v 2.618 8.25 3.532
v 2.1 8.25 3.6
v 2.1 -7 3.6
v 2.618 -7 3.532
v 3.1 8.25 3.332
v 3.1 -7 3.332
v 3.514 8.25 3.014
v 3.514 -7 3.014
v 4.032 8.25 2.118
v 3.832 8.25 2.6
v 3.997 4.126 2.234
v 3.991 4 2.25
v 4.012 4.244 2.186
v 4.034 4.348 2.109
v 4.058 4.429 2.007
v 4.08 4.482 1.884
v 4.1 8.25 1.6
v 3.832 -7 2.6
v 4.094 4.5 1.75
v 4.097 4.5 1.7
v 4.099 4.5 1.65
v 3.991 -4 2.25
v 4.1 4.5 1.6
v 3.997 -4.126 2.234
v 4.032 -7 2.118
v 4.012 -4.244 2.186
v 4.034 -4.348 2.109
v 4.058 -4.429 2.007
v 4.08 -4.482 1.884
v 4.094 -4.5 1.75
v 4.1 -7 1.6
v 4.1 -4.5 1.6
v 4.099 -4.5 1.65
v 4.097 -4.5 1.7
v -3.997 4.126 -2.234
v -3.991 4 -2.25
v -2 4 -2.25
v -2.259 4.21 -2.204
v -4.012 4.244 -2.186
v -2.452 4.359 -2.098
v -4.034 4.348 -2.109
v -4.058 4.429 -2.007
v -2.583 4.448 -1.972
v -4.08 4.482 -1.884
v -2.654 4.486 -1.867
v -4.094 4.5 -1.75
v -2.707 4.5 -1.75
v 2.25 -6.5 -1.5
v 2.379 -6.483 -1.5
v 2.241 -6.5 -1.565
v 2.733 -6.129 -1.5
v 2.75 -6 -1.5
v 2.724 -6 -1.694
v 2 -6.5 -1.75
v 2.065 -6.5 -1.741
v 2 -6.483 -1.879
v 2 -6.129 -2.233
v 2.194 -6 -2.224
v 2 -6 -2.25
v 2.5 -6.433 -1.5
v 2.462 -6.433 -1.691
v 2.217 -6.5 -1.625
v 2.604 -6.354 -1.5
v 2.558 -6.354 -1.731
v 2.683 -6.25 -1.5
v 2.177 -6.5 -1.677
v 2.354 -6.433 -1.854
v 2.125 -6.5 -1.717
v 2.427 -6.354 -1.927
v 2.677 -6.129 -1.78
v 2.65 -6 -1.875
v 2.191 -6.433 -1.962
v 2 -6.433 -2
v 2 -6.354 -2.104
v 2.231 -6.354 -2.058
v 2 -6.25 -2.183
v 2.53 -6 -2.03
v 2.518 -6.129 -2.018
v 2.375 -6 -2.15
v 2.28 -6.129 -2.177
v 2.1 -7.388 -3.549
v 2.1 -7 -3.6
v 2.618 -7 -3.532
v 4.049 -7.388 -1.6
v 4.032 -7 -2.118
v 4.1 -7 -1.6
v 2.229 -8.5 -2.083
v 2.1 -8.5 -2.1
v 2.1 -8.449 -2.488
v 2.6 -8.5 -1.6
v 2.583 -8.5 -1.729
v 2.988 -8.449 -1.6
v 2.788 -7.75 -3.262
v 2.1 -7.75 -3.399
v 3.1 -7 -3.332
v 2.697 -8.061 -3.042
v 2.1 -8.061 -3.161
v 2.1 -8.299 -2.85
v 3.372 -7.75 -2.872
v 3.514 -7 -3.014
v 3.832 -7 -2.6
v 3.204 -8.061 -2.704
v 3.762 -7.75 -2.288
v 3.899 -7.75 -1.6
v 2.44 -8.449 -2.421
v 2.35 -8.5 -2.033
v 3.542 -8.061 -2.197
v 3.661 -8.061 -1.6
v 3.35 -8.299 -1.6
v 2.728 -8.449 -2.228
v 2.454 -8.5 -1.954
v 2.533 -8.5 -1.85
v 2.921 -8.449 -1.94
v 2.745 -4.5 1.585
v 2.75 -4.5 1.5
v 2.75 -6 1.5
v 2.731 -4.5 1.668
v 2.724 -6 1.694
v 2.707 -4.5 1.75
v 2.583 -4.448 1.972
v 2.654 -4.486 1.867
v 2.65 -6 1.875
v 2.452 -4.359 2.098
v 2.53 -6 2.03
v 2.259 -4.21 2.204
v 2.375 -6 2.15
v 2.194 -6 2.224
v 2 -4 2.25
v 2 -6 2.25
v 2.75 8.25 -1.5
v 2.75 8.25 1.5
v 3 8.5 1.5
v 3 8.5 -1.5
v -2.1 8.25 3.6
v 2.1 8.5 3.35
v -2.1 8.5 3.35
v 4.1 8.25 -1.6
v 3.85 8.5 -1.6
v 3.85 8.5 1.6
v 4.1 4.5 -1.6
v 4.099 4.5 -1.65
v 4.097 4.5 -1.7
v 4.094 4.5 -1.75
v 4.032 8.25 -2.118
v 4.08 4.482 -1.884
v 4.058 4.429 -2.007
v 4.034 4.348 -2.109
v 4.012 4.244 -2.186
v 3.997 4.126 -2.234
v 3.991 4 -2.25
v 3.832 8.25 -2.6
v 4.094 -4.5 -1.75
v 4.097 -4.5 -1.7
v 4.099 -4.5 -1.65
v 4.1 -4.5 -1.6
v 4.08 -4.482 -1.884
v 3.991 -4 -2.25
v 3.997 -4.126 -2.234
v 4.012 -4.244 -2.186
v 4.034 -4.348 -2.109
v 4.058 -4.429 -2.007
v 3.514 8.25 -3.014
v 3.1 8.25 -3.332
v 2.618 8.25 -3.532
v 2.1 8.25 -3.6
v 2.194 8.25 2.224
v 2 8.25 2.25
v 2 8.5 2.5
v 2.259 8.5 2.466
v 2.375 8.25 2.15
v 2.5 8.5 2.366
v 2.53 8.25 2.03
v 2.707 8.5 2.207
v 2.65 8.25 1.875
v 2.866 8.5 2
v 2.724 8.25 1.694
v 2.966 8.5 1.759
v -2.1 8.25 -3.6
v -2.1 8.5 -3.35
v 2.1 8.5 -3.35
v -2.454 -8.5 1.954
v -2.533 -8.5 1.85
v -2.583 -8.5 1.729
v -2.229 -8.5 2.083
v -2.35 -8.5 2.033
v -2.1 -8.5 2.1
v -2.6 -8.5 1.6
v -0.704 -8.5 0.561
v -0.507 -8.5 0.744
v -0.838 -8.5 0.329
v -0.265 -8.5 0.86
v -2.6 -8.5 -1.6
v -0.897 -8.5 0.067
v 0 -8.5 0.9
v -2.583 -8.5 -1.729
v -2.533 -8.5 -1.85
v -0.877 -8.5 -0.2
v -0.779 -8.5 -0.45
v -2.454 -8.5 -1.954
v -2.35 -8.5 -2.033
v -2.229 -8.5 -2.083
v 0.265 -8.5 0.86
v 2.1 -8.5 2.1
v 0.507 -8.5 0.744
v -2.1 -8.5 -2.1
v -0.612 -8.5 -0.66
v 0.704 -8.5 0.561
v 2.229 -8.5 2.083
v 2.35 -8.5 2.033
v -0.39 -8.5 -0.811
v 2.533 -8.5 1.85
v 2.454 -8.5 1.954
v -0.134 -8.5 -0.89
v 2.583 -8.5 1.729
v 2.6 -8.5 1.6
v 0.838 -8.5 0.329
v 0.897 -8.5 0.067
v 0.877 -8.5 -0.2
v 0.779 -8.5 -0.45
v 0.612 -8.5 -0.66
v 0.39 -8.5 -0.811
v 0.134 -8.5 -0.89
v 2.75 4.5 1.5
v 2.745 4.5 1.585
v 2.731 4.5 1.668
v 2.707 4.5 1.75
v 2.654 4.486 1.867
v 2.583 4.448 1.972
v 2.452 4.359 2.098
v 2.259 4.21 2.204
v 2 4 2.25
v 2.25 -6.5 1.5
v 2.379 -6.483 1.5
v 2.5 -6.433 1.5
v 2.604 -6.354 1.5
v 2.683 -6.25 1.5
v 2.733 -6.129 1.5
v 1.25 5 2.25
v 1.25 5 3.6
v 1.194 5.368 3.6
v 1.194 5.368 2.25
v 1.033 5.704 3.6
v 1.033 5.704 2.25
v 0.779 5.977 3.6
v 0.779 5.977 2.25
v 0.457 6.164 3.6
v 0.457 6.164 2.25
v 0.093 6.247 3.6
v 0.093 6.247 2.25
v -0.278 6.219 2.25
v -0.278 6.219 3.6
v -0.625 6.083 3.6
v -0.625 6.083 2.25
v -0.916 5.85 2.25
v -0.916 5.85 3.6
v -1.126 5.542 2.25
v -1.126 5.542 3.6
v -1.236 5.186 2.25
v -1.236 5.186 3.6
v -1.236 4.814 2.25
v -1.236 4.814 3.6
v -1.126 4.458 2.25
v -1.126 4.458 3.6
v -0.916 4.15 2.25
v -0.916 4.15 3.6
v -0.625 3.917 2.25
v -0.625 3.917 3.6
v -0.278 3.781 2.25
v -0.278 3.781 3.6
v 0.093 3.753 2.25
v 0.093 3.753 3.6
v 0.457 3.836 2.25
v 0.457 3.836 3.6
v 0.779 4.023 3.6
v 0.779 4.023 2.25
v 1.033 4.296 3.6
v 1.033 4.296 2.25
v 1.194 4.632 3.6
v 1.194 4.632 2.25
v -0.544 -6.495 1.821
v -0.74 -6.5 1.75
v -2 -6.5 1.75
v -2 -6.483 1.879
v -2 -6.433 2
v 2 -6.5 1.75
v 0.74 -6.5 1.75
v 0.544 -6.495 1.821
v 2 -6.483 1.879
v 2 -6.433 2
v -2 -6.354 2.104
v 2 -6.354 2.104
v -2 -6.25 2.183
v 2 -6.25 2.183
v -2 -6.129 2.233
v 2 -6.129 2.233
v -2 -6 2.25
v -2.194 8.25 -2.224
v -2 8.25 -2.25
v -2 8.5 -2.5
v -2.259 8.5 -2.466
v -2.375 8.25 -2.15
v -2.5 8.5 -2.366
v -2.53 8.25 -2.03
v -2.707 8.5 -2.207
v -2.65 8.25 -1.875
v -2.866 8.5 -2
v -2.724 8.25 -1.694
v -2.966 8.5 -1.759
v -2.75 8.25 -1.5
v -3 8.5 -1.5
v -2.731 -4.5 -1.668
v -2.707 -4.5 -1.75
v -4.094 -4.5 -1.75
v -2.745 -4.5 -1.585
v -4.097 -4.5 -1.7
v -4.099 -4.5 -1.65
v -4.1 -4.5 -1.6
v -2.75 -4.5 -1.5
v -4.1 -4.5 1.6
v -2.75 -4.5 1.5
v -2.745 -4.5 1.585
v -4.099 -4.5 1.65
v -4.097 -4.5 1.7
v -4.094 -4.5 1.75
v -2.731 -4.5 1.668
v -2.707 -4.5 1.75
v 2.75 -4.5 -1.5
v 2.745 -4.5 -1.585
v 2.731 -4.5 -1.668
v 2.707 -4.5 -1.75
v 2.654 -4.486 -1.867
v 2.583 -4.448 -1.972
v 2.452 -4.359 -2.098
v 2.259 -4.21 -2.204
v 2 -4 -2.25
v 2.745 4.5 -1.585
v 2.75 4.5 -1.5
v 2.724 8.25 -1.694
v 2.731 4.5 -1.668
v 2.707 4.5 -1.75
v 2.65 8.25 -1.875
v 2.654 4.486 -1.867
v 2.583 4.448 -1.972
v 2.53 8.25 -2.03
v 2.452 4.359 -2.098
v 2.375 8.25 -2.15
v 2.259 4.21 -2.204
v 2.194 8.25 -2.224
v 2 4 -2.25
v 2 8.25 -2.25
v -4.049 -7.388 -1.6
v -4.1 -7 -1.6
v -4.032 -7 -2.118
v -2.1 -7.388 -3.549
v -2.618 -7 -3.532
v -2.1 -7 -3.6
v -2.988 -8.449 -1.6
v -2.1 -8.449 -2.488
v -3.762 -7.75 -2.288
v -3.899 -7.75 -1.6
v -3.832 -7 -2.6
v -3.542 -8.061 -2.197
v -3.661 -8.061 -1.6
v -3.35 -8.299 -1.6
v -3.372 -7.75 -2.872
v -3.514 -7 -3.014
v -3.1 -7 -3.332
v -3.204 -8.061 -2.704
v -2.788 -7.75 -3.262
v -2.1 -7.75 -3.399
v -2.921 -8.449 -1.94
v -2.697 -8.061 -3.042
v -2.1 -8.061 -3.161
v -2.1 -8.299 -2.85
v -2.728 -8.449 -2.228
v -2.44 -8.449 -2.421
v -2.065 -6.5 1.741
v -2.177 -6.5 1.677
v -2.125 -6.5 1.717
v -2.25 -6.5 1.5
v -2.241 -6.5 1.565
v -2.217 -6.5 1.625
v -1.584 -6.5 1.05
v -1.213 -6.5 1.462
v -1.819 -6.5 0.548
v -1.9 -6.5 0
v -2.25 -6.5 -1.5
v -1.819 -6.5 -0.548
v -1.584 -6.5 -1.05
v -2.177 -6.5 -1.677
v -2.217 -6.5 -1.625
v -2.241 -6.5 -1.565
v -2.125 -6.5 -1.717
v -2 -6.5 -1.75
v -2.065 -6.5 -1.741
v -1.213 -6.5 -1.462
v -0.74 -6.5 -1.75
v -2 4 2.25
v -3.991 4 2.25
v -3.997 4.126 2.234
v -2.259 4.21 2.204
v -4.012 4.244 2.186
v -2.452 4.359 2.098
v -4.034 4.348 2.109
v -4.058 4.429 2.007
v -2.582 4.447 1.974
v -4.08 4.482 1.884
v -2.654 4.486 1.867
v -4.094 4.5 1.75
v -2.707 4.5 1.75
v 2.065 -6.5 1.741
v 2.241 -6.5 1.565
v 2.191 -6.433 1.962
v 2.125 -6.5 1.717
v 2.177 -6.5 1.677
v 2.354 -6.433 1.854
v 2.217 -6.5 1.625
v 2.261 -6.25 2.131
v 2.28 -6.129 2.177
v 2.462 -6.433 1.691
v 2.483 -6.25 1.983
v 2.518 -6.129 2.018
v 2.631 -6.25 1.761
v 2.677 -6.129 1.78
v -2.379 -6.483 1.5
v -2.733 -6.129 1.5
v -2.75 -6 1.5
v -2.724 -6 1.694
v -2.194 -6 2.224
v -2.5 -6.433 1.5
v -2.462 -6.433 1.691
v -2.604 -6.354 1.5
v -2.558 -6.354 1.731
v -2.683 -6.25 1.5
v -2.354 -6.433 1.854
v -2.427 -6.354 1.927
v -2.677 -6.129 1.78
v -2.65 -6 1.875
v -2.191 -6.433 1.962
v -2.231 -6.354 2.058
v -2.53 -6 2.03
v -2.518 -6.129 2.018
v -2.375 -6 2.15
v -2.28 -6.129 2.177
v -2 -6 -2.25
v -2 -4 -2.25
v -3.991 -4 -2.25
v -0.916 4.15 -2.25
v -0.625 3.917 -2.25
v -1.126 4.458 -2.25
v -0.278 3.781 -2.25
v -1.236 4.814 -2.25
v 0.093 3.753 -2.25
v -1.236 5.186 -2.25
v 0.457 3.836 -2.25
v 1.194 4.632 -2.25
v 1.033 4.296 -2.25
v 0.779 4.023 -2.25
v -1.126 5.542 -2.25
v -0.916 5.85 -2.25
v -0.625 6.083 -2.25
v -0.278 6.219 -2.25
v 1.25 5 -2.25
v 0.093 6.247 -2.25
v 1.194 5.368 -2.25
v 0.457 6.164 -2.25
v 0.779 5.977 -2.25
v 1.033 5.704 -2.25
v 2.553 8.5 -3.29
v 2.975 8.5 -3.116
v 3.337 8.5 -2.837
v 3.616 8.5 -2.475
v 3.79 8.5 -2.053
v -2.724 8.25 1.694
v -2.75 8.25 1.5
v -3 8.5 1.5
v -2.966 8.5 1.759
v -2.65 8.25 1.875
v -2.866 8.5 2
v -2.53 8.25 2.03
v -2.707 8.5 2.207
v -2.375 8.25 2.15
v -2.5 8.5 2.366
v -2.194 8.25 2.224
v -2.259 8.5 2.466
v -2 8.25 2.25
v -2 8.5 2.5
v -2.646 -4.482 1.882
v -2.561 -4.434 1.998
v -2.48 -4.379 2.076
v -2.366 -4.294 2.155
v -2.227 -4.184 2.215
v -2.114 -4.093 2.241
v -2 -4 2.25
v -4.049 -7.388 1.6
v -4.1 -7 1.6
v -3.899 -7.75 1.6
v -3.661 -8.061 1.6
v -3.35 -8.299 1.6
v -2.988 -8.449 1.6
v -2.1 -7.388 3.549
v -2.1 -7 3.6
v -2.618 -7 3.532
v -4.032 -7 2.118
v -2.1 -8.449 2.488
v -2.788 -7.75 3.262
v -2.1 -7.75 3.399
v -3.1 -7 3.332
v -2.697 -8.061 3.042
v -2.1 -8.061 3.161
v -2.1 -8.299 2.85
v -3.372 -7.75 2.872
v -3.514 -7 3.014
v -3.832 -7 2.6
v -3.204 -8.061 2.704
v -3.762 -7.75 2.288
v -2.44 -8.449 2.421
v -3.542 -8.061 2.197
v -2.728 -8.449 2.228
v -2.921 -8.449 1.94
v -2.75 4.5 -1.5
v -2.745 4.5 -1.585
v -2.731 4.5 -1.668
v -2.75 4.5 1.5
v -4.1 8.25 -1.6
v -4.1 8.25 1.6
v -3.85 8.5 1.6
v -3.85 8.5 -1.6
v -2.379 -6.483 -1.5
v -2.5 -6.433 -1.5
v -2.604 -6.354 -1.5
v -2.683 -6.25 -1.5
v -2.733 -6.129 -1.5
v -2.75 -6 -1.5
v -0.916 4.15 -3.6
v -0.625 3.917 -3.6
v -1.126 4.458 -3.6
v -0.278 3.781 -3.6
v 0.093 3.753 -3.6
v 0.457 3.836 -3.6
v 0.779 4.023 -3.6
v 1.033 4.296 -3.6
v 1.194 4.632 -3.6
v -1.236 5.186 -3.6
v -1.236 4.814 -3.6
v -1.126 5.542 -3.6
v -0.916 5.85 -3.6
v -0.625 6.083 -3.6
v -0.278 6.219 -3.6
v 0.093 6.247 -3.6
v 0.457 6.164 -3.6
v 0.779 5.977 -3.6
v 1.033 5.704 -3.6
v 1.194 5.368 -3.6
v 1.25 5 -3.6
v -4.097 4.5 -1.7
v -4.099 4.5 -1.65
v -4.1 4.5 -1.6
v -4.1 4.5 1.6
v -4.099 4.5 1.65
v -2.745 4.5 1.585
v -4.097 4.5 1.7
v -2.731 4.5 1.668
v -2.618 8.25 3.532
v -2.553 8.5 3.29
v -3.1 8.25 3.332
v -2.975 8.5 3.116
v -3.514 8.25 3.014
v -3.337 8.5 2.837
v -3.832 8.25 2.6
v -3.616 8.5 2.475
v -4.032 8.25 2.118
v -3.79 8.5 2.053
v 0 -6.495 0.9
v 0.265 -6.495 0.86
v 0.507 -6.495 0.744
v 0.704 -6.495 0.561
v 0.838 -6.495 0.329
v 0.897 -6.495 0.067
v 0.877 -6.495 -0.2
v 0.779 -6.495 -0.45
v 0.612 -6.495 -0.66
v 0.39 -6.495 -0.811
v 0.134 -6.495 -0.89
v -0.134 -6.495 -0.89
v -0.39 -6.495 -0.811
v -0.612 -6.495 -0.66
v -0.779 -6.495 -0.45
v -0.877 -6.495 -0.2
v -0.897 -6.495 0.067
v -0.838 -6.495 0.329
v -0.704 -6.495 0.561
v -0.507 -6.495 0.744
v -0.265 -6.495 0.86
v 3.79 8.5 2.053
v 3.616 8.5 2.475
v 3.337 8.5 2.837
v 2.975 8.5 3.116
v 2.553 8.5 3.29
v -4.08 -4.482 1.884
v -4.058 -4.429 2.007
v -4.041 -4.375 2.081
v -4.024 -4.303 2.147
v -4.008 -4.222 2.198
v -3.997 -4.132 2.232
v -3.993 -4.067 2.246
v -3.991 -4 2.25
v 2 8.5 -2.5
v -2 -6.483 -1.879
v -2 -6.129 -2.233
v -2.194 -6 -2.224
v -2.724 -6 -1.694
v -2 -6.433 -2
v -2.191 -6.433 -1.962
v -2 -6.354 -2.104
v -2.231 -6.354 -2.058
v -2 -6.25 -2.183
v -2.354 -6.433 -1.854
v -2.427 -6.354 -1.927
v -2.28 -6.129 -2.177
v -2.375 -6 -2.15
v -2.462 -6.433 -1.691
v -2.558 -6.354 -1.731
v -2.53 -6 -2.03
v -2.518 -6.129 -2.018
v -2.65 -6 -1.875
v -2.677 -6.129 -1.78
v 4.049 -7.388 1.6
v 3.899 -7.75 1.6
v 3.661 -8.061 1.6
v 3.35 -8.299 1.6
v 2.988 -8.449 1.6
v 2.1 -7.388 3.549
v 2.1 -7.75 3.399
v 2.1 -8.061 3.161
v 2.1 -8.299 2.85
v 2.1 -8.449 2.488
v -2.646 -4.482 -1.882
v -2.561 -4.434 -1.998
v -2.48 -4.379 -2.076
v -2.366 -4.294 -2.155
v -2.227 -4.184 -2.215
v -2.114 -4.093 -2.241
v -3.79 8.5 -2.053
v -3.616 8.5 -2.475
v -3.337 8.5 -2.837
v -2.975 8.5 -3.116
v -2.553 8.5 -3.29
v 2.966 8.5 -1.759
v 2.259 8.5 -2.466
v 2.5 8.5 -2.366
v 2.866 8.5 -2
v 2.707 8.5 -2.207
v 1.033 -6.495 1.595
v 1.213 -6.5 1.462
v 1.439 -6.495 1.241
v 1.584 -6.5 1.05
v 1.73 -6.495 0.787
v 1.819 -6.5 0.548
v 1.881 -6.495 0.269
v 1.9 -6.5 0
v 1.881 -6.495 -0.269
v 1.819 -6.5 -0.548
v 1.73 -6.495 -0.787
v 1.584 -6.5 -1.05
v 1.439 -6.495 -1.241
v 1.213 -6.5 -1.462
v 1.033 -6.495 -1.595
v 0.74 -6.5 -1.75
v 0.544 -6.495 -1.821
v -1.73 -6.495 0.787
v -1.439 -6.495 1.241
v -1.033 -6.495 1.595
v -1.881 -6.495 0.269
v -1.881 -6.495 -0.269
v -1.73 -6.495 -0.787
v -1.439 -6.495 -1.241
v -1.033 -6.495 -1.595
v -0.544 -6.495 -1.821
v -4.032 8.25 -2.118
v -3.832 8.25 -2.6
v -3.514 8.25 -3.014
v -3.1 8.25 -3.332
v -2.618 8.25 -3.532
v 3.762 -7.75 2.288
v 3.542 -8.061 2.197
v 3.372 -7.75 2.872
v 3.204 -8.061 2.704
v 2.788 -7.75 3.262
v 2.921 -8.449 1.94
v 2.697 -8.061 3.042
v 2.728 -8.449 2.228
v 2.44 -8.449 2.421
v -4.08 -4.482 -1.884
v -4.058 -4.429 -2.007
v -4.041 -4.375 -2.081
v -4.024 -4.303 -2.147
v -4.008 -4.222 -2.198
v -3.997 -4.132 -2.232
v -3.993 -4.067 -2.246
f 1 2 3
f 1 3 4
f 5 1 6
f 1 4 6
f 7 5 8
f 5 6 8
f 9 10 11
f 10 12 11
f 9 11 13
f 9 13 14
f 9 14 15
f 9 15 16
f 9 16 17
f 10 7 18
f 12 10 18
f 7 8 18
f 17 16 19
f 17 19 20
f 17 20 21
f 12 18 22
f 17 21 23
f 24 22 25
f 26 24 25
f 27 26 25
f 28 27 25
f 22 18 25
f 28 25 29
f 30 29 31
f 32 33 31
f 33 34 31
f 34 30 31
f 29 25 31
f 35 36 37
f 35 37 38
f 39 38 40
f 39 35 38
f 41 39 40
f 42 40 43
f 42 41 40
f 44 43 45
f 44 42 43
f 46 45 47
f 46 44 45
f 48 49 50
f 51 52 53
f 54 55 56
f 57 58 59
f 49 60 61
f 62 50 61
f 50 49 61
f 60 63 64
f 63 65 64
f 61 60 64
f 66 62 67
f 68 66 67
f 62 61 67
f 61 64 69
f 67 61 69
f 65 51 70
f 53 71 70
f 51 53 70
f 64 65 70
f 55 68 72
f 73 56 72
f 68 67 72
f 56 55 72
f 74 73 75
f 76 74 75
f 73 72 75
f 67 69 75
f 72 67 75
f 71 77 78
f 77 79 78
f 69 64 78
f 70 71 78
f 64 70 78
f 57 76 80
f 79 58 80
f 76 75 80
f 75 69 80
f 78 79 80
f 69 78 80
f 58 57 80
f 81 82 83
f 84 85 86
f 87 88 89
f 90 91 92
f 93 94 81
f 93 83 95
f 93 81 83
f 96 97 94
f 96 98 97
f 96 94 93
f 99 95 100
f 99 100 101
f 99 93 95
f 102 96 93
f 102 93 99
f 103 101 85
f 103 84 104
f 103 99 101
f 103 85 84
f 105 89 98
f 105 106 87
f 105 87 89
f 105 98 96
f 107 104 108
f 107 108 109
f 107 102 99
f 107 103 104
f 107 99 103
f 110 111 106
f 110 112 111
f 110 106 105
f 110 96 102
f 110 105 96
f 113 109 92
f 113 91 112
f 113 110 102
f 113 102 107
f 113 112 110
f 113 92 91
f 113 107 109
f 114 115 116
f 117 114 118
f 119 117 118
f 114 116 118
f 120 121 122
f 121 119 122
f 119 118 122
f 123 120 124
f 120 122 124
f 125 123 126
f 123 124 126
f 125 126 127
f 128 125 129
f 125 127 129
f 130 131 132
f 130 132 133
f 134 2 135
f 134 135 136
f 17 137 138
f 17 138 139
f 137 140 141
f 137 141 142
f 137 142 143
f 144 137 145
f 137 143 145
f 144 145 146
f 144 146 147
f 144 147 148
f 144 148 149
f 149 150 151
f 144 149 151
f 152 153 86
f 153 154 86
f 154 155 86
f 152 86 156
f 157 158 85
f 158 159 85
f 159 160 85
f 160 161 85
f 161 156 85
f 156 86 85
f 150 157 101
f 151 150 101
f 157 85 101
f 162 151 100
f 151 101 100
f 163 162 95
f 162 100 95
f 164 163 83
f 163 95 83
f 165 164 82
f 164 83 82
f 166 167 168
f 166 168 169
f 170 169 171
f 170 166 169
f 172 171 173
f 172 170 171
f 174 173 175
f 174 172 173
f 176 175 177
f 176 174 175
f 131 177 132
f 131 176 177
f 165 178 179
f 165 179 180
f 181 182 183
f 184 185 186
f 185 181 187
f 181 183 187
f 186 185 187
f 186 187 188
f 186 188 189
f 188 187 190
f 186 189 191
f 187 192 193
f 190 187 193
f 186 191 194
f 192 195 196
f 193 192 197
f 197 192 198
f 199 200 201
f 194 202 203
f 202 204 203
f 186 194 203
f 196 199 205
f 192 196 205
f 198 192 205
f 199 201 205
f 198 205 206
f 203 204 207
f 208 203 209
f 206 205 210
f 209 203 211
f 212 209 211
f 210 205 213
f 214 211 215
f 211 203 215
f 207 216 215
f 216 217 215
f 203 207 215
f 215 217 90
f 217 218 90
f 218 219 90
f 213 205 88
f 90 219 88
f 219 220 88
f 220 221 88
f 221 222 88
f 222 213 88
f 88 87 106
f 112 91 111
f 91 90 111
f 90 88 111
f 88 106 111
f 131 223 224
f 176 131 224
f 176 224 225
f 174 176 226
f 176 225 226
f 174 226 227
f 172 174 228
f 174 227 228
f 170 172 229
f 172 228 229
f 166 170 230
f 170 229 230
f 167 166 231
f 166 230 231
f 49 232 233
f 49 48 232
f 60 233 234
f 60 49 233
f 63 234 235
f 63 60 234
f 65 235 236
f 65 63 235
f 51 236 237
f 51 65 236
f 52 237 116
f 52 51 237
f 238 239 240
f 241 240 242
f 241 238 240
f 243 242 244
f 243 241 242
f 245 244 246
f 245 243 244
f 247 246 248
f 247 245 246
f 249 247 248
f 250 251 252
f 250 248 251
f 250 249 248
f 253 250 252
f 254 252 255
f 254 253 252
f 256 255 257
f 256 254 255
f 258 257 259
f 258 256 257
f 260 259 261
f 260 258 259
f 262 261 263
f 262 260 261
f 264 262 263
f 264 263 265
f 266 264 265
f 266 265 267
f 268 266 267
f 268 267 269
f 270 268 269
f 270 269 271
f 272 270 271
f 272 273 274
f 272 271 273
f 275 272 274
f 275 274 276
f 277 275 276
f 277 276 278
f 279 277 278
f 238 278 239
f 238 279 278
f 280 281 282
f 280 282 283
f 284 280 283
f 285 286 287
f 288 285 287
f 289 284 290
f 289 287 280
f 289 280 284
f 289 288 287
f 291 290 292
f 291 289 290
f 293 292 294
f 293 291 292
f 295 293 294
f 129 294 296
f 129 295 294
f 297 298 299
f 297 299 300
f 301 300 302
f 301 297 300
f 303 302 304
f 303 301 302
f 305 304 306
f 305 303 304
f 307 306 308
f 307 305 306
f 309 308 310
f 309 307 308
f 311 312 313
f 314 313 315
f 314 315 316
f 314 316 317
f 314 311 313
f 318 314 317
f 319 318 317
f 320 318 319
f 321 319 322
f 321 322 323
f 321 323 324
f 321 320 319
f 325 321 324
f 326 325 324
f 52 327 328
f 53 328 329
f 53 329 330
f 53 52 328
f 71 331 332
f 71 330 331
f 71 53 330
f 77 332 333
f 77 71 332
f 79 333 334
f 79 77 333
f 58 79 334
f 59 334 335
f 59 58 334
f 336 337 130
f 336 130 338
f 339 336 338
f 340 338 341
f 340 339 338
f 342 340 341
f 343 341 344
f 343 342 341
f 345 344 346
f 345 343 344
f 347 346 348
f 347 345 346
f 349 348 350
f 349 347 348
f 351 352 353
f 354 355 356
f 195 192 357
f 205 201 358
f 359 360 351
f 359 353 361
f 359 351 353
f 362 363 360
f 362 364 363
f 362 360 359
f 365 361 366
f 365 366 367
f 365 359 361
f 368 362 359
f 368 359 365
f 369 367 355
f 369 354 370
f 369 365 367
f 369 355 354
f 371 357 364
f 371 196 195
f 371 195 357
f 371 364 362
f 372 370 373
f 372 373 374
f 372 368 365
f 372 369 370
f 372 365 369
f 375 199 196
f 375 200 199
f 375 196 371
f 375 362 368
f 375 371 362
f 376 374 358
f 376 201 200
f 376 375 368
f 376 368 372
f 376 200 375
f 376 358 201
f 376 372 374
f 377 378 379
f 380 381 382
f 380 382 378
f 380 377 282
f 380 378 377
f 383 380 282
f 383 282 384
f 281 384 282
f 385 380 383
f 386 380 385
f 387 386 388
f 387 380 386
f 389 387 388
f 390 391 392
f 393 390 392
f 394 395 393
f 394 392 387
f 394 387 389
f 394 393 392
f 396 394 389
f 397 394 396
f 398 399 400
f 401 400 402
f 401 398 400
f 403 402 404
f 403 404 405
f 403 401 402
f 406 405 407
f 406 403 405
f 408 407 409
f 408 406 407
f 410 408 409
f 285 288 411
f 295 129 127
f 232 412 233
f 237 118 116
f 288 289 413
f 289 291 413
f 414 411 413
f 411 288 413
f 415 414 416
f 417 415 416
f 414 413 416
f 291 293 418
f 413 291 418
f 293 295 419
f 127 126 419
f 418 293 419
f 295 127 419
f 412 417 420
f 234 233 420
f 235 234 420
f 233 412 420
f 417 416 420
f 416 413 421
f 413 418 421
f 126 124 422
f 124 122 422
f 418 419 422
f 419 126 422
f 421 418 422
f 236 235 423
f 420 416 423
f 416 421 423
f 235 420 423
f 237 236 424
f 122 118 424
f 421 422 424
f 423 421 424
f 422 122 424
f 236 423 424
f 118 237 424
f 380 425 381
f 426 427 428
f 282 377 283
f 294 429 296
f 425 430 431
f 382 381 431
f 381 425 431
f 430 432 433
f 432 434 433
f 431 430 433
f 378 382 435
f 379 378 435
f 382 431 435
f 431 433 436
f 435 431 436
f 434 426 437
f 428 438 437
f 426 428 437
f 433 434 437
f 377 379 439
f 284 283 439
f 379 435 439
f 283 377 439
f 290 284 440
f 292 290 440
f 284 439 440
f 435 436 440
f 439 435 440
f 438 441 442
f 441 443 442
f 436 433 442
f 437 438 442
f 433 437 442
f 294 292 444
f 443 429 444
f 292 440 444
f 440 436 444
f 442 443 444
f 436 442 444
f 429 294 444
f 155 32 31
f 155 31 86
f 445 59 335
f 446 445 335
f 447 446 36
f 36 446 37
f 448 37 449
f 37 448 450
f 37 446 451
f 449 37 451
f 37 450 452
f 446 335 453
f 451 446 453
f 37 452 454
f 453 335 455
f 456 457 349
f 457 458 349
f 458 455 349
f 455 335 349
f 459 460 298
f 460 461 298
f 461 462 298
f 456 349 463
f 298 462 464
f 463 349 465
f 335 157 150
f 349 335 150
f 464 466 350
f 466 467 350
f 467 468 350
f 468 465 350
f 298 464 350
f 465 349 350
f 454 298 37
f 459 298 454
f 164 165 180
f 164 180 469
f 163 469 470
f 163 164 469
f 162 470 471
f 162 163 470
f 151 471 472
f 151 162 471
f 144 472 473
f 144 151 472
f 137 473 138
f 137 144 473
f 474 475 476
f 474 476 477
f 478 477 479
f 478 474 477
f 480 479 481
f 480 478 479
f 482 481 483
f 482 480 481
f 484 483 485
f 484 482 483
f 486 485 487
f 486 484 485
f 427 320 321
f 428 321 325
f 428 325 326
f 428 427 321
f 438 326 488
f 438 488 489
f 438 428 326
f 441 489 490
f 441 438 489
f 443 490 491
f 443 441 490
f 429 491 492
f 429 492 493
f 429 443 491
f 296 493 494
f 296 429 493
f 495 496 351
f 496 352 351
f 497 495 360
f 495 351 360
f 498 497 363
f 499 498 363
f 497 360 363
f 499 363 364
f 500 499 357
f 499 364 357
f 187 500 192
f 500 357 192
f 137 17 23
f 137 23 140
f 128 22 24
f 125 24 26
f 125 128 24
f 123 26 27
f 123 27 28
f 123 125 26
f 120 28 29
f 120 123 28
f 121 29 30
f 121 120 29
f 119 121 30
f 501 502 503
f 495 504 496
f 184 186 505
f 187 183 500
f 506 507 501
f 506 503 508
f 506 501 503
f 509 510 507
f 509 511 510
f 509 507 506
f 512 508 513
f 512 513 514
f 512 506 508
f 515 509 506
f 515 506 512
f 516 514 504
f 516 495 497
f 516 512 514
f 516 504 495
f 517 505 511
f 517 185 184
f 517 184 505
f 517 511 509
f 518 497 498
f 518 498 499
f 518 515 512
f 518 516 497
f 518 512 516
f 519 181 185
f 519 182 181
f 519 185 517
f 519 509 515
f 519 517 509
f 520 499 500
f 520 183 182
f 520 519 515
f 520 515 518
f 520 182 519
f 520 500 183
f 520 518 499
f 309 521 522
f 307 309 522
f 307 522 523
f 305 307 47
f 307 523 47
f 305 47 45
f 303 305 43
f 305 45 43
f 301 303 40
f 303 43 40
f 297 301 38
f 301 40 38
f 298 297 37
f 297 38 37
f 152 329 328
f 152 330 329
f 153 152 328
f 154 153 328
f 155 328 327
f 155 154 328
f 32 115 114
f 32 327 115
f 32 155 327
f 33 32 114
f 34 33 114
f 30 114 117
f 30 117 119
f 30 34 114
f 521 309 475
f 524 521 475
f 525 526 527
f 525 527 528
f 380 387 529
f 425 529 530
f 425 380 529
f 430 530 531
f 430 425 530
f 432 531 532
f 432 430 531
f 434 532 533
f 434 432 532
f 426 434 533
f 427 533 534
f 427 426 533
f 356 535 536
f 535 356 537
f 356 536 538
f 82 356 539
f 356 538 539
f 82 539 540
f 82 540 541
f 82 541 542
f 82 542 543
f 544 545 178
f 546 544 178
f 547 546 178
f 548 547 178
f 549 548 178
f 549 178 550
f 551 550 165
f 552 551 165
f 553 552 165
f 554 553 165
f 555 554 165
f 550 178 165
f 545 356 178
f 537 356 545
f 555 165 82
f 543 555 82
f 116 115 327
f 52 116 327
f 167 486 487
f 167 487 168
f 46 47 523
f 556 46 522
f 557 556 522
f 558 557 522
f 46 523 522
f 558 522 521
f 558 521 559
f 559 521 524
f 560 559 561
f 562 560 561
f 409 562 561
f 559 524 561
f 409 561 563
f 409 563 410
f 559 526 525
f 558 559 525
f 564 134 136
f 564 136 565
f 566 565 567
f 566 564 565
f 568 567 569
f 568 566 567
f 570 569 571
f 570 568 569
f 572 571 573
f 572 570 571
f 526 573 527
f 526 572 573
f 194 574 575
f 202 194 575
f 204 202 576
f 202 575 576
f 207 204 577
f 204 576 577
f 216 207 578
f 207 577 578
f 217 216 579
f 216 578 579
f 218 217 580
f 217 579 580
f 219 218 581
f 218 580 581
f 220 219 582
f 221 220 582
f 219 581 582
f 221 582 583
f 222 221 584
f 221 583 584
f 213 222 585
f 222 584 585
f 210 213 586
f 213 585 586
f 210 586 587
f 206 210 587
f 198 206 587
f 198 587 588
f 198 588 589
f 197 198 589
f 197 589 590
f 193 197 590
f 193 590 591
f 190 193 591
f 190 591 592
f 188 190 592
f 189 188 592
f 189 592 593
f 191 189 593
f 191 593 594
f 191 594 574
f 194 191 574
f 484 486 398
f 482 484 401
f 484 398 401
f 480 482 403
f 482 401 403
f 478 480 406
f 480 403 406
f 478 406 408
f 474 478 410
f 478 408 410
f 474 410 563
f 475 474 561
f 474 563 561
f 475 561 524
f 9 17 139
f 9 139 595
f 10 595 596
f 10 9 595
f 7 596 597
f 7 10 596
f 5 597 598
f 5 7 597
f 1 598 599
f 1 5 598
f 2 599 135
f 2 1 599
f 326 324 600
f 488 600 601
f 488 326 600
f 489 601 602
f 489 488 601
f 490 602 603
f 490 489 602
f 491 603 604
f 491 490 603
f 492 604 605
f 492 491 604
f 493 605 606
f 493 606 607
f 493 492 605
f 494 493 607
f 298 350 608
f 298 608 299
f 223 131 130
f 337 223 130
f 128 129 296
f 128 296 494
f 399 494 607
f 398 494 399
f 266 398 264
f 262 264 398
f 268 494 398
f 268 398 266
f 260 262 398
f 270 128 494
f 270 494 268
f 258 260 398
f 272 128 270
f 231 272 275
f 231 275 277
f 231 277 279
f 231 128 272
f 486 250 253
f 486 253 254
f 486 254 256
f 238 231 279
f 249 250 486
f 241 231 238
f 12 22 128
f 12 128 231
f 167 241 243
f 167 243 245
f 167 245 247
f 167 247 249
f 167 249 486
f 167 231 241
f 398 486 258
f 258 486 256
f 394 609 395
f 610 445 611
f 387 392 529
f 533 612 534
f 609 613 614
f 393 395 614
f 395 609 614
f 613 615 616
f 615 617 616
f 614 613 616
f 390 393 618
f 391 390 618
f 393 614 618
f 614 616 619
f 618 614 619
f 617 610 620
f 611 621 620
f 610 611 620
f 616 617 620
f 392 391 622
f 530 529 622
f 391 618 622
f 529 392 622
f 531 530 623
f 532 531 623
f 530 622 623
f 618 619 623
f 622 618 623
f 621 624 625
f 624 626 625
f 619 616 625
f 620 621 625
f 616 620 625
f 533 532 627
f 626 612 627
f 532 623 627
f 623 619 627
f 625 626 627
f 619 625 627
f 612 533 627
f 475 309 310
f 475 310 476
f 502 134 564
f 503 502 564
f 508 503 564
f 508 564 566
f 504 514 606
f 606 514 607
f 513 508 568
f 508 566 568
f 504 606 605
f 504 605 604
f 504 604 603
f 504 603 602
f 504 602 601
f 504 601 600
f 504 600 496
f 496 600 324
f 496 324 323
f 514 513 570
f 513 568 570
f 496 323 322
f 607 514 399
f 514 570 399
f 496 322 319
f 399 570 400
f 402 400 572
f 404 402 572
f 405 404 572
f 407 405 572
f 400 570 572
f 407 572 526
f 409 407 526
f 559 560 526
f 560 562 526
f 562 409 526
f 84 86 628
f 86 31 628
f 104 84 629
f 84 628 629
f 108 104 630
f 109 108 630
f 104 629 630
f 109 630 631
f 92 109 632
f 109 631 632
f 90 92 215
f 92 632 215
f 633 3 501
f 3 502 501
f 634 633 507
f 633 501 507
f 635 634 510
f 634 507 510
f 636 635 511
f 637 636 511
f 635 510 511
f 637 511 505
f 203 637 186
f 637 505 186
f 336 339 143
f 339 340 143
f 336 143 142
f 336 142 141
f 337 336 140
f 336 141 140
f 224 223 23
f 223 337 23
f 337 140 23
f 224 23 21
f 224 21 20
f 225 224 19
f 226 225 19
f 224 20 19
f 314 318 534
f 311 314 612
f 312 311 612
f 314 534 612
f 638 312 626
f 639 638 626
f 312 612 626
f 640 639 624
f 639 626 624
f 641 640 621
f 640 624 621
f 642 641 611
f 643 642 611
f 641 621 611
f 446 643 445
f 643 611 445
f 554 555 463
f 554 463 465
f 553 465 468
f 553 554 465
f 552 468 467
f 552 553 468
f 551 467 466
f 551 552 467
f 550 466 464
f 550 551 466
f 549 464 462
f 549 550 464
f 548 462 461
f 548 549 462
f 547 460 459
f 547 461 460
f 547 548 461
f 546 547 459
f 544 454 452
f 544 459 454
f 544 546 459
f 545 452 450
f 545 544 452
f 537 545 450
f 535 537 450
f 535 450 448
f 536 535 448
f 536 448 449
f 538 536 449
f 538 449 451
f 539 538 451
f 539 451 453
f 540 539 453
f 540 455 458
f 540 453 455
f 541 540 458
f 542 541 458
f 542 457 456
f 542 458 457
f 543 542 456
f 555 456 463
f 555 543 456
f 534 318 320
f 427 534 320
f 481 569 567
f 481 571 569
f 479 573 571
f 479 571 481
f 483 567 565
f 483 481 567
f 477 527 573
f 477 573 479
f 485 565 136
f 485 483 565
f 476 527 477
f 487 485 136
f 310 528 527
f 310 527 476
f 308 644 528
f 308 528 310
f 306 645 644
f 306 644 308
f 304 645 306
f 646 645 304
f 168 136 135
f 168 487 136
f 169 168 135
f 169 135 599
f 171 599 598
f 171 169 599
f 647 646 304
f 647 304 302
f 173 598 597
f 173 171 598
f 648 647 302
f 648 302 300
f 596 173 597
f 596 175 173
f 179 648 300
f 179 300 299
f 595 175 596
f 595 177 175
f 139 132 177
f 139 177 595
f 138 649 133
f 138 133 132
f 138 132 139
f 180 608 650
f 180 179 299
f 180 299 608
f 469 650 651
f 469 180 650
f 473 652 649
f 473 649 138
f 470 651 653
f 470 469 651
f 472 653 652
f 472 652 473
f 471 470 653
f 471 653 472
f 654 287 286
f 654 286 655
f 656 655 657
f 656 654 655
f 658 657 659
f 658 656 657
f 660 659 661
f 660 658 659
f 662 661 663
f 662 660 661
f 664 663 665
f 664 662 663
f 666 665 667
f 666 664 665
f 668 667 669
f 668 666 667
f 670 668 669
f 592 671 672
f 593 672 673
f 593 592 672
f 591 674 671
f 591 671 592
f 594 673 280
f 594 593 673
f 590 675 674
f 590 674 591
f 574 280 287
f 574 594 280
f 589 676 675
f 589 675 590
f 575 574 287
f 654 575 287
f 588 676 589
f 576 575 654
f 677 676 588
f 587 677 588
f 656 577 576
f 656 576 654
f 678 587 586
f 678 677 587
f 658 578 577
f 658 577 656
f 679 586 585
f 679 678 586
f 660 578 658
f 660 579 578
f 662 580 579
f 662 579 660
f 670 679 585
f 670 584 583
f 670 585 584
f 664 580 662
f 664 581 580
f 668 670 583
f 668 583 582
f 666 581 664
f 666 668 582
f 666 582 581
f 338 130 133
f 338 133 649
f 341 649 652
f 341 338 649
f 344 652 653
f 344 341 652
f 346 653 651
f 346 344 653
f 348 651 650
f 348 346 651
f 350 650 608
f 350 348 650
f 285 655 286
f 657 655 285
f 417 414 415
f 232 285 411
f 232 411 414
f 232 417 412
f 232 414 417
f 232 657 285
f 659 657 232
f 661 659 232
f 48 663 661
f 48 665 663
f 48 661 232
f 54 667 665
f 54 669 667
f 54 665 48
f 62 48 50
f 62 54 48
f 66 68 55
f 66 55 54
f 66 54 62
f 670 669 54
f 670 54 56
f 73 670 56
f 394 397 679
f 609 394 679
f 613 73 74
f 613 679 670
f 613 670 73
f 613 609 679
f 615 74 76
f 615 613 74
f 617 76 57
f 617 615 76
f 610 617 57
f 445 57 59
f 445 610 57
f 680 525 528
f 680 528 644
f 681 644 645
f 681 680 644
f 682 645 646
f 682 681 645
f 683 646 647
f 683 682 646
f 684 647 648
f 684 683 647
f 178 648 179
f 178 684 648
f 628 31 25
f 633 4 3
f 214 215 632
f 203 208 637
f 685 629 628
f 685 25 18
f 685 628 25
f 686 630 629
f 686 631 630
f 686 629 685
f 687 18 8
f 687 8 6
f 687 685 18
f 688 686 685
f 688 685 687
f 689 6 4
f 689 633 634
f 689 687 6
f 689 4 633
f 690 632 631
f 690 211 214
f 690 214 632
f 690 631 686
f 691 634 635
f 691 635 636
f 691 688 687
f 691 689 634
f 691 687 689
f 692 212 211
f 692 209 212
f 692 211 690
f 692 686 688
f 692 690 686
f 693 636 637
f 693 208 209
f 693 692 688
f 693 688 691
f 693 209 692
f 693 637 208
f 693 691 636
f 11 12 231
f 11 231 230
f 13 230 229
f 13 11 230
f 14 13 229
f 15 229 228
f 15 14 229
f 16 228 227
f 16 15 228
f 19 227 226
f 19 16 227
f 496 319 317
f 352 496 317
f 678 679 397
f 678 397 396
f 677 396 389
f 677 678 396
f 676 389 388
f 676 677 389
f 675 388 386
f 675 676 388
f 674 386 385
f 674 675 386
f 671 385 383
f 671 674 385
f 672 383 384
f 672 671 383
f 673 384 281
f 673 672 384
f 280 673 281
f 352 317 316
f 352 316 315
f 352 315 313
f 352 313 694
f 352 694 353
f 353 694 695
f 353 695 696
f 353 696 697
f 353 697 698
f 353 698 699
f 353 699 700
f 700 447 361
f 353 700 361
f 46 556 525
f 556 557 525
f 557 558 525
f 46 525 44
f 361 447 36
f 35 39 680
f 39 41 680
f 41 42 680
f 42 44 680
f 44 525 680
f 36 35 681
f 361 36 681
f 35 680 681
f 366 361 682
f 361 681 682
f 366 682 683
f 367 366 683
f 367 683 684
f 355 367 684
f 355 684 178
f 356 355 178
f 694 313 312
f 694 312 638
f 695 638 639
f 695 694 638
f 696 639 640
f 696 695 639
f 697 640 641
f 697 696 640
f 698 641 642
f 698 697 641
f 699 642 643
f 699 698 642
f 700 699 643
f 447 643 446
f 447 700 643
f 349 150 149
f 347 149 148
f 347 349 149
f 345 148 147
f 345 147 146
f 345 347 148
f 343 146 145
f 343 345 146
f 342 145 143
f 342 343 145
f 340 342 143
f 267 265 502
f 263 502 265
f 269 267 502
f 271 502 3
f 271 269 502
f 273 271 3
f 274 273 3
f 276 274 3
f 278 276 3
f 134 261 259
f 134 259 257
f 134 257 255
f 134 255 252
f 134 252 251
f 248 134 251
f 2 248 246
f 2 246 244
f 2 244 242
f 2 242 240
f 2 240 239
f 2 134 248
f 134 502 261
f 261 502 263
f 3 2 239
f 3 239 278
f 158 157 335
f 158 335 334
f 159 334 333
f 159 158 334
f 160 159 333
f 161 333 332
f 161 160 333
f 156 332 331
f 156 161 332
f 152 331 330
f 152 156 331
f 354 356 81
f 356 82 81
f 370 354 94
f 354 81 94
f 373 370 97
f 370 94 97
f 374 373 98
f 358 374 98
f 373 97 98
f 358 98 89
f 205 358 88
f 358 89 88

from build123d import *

# Parameters (mm, degrees)
SKETCH1_W                 = 8.2
SKETCH1_H                 = 7.2
BOSS_EXTRUDE1_DEPTH       = 8.5
SKETCH2_W                 = 0.25
SKETCH2_H                 = 0.25
SKETCH2_H_2               = 4
SKETCH2_W_2               = 5
CHAIN_DEPTH               = 15
F_2_5_MM_DOWEL_DEPTH      = 11.100495037
F_2_5_MM_DOWEL_DEPTH_BACK = 11.100495037
SKETCH3_R                 = 1.25
SKETCH4_R                 = 0.9
STEEL_CABLE_CHANNEL_DEPTH = 11.100495037
CRIMP_WINDOW_DEPTH        = 11.100495037
CRIMP_WINDOW_DEPTH_BACK   = 11.100495037
SKETCH7_W                 = 4.5
SKETCH7_H                 = 9
FILLET6_R                 = 0.75
FILLET7_R                 = 0.5
FILLET9_R                 = 0.5
FILLET3_R                 = 2
FILLET5_R                 = 1.5
CHAMFER1_SIZE             = 0.25
BOSS_EXTRUDE2_START       = 0.005
SKETCH5_R                 = 1.9
SKETCH5_R_2               = 0.9
BOSS_EXTRUDE2_DEPTH       = 0.005


with BuildPart() as part:
    # Sketch1 → Boss-Extrude1 (new, symmetric)
    with BuildSketch(Plane(origin=(0, 0, 0), x_dir=(1, 0, 0), z_dir=(0, 1, 0))):
        Rectangle(SKETCH1_W, SKETCH1_H)
    extrude(amount=BOSS_EXTRUDE1_DEPTH, both=True)

    # Sketch2 → chain (cut)
    with BuildSketch(Plane(origin=(0, 8.5, 0), x_dir=(1, 0, 0), z_dir=(0, 1, 0))):
        with Locations((-2.625, 2.125)):
            Rectangle(SKETCH2_W, SKETCH2_H)
        with Locations((-2.625, 0)):
            Rectangle(SKETCH2_W, SKETCH2_H_2)
        with Locations((0, 2.125)):
            Rectangle(SKETCH2_W_2, SKETCH2_H)
        Rectangle(SKETCH2_W_2, SKETCH2_H_2)
        with Locations((2.625, 2.125)):
            Rectangle(SKETCH2_W, SKETCH2_H)
        with Locations((2.625, 0)):
            Rectangle(SKETCH2_W, SKETCH2_H_2)
        with Locations((2.625, -2.125)):
            Rectangle(SKETCH2_W, SKETCH2_H)
        with Locations((0, -2.125)):
            Rectangle(SKETCH2_W_2, SKETCH2_H)
        with Locations((-2.625, -2.125)):
            Rectangle(SKETCH2_W, SKETCH2_H)
    extrude(amount=-CHAIN_DEPTH, mode=Mode.SUBTRACT)

    # Sketch3 → 2.5 mm dowel (cut, two sides: drawn at the far end of the back side and taken through both)
    with BuildSketch(Plane.XY.offset(-F_2_5_MM_DOWEL_DEPTH_BACK)):
        with Locations((0, 5)):
            Circle(SKETCH3_R)
    extrude(amount=F_2_5_MM_DOWEL_DEPTH + F_2_5_MM_DOWEL_DEPTH_BACK, mode=Mode.SUBTRACT)

    # Sketch4 → steel cable channel (cut, through all)
    with BuildSketch(Plane(origin=(0, 0, 0), x_dir=(1, 0, 0), z_dir=(0, 1, 0))):
        with Locations(Location((0, 0, 0), (0, 0, 270))):
            Circle(SKETCH4_R)
    extrude(amount=-STEEL_CABLE_CHANNEL_DEPTH, mode=Mode.SUBTRACT)

    # Sketch7 → crimp window (cut, two sides: drawn at the far end of the back side and taken through both)
    with BuildSketch(Plane.ZY.offset(-CRIMP_WINDOW_DEPTH_BACK)):
        Rectangle(SKETCH7_W, SKETCH7_H)
    extrude(amount=CRIMP_WINDOW_DEPTH + CRIMP_WINDOW_DEPTH_BACK, mode=Mode.SUBTRACT)

    # Fillet6
    fillet6_edges = [part.edges().sort_by_distance(p)[0] for p in [
        (-2.75, -5.5, -2.25),
        (2.75, -5.5, -2.25),
        (2.75, -5.5, 2.25),
        (-2.75, -5.5, 2.25),
        (-2.75, 6.5, -2.25),
        (-2.75, 6.5, 2.25),
        (2.75, 6.5, 2.25),
        (2.75, 6.5, -2.25),
    ]]
    fillet(fillet6_edges, radius=FILLET6_R)

    # Fillet7
    fillet7_edges = [part.edges().sort_by_distance(p)[0] for p in [
        (2.75, -6.5, 0),
        (2.530330086, -6.5, -2.030330086),
        (2.530330086, -6.5, 2.030330086),
        (-2.530330086, -6.5, 2.030330086),
        (-2.530330086, -6.5, -2.030330086),
        (0, -6.5, -2.25),
        (0, -6.5, 2.25),
        (-2.75, -6.5, 0),
    ]]
    fillet(fillet7_edges, radius=FILLET7_R)

    # Fillet9
    fillet9_edges = [part.edges().sort_by_distance(p)[0] for p in [
        (3.05, 4.5, -2.25),
        (3.05, -4.5, 2.25),
        (3.05, 4.5, 2.25),
        (-3.05, 4.5, 2.25),
        (3.05, -4.5, -2.25),
        (-3.05, -4.5, -2.25),
        (-3.05, 4.5, -2.25),
        (-3.05, -4.5, 2.25),
    ]]
    fillet(fillet9_edges, radius=FILLET9_R)

    # Fillet3
    # the kernel refuses this fillet: 2 mm, written as the material it takes off along each edge
    with BuildSketch(Plane(origin=(-4.1, 13.5, -3.6), x_dir=(1, 0, 0), z_dir=(0, -1, 0)), Plane(origin=(4.1, -13.5, -3.6), x_dir=(-1, 0, 0), z_dir=(0, 1, 0))) as fillet3_piece_1:
        with BuildLine():
            CenterArc((FILLET3_R, FILLET3_R), FILLET3_R, 180, 90)
            Line((0, FILLET3_R), (0, 0))
            Line((0, 0), (FILLET3_R, 0))
        make_face()
    extrude(amount=27, mode=Mode.SUBTRACT)
    with BuildSketch(Plane(origin=(-4.1, 13.5, 3.6), x_dir=(1, 0, 0), z_dir=(0, -1, 0)), Plane(origin=(4.1, -13.5, 3.6), x_dir=(-1, 0, 0), z_dir=(0, 1, 0))) as fillet3_piece_2:
        with BuildLine():
            CenterArc((FILLET3_R, -FILLET3_R), FILLET3_R, 90, 90)
            Line((0, -FILLET3_R), (0, 0))
            Line((0, 0), (FILLET3_R, 0))
        make_face()
    extrude(amount=27, mode=Mode.SUBTRACT)

    # Fillet5
    fillet5_edges = [part.edges().sort_by_distance(p)[0] for p in [
        (-4.1, -8.5, 0),
        (4.1, -8.5, 0),
        (0, -8.5, 3.6),
        (0, -8.5, -3.6),
        (3.514213562, -8.5, 3.014213562),
        (3.514213562, -8.5, -3.014213562),
        (-3.514213562, -8.5, 3.014213562),
        (-3.514213562, -8.5, -3.014213562),
    ]]
    fillet(fillet5_edges, radius=FILLET5_R)

    # Chamfer1
    chamfer1_edges = [part.edges().sort_by_distance(p)[0] for p in [
        (2.530330086, 8.5, -2.030330086),
        (-2.530330086, 8.5, -2.030330086),
        (2.530330086, 8.5, 2.030330086),
        (-2.530330086, 8.5, 2.030330086),
        (-4.1, 8.5, 0),
        (0, 8.5, -3.6),
        (4.1, 8.5, 0),
        (0, 8.5, 3.6),
        (3.514213562, 8.5, 3.014213562),
        (3.514213562, 8.5, -3.014213562),
        (-3.514213562, 8.5, 3.014213562),
        (-3.514213562, 8.5, -3.014213562),
        (0, 8.5, -2.25),
        (2.75, 8.5, 0),
        (-2.75, 8.5, 0),
        (0, 8.5, 2.25),
    ]]
    chamfer(chamfer1_edges, length=CHAMFER1_SIZE)

    # Sketch5 → Boss-Extrude2 (add)
    with BuildSketch(Plane(origin=(0, -6.5, 0), x_dir=(1, 0, 0), z_dir=(0, 1, 0)).offset(BOSS_EXTRUDE2_START)):
        Circle(SKETCH5_R)
        with Locations(Location((0, 0, 0), (0, 0, 270))):
            Circle(SKETCH5_R_2, mode=Mode.SUBTRACT)
    extrude(amount=-BOSS_EXTRUDE2_DEPTH)


solid = part.part
